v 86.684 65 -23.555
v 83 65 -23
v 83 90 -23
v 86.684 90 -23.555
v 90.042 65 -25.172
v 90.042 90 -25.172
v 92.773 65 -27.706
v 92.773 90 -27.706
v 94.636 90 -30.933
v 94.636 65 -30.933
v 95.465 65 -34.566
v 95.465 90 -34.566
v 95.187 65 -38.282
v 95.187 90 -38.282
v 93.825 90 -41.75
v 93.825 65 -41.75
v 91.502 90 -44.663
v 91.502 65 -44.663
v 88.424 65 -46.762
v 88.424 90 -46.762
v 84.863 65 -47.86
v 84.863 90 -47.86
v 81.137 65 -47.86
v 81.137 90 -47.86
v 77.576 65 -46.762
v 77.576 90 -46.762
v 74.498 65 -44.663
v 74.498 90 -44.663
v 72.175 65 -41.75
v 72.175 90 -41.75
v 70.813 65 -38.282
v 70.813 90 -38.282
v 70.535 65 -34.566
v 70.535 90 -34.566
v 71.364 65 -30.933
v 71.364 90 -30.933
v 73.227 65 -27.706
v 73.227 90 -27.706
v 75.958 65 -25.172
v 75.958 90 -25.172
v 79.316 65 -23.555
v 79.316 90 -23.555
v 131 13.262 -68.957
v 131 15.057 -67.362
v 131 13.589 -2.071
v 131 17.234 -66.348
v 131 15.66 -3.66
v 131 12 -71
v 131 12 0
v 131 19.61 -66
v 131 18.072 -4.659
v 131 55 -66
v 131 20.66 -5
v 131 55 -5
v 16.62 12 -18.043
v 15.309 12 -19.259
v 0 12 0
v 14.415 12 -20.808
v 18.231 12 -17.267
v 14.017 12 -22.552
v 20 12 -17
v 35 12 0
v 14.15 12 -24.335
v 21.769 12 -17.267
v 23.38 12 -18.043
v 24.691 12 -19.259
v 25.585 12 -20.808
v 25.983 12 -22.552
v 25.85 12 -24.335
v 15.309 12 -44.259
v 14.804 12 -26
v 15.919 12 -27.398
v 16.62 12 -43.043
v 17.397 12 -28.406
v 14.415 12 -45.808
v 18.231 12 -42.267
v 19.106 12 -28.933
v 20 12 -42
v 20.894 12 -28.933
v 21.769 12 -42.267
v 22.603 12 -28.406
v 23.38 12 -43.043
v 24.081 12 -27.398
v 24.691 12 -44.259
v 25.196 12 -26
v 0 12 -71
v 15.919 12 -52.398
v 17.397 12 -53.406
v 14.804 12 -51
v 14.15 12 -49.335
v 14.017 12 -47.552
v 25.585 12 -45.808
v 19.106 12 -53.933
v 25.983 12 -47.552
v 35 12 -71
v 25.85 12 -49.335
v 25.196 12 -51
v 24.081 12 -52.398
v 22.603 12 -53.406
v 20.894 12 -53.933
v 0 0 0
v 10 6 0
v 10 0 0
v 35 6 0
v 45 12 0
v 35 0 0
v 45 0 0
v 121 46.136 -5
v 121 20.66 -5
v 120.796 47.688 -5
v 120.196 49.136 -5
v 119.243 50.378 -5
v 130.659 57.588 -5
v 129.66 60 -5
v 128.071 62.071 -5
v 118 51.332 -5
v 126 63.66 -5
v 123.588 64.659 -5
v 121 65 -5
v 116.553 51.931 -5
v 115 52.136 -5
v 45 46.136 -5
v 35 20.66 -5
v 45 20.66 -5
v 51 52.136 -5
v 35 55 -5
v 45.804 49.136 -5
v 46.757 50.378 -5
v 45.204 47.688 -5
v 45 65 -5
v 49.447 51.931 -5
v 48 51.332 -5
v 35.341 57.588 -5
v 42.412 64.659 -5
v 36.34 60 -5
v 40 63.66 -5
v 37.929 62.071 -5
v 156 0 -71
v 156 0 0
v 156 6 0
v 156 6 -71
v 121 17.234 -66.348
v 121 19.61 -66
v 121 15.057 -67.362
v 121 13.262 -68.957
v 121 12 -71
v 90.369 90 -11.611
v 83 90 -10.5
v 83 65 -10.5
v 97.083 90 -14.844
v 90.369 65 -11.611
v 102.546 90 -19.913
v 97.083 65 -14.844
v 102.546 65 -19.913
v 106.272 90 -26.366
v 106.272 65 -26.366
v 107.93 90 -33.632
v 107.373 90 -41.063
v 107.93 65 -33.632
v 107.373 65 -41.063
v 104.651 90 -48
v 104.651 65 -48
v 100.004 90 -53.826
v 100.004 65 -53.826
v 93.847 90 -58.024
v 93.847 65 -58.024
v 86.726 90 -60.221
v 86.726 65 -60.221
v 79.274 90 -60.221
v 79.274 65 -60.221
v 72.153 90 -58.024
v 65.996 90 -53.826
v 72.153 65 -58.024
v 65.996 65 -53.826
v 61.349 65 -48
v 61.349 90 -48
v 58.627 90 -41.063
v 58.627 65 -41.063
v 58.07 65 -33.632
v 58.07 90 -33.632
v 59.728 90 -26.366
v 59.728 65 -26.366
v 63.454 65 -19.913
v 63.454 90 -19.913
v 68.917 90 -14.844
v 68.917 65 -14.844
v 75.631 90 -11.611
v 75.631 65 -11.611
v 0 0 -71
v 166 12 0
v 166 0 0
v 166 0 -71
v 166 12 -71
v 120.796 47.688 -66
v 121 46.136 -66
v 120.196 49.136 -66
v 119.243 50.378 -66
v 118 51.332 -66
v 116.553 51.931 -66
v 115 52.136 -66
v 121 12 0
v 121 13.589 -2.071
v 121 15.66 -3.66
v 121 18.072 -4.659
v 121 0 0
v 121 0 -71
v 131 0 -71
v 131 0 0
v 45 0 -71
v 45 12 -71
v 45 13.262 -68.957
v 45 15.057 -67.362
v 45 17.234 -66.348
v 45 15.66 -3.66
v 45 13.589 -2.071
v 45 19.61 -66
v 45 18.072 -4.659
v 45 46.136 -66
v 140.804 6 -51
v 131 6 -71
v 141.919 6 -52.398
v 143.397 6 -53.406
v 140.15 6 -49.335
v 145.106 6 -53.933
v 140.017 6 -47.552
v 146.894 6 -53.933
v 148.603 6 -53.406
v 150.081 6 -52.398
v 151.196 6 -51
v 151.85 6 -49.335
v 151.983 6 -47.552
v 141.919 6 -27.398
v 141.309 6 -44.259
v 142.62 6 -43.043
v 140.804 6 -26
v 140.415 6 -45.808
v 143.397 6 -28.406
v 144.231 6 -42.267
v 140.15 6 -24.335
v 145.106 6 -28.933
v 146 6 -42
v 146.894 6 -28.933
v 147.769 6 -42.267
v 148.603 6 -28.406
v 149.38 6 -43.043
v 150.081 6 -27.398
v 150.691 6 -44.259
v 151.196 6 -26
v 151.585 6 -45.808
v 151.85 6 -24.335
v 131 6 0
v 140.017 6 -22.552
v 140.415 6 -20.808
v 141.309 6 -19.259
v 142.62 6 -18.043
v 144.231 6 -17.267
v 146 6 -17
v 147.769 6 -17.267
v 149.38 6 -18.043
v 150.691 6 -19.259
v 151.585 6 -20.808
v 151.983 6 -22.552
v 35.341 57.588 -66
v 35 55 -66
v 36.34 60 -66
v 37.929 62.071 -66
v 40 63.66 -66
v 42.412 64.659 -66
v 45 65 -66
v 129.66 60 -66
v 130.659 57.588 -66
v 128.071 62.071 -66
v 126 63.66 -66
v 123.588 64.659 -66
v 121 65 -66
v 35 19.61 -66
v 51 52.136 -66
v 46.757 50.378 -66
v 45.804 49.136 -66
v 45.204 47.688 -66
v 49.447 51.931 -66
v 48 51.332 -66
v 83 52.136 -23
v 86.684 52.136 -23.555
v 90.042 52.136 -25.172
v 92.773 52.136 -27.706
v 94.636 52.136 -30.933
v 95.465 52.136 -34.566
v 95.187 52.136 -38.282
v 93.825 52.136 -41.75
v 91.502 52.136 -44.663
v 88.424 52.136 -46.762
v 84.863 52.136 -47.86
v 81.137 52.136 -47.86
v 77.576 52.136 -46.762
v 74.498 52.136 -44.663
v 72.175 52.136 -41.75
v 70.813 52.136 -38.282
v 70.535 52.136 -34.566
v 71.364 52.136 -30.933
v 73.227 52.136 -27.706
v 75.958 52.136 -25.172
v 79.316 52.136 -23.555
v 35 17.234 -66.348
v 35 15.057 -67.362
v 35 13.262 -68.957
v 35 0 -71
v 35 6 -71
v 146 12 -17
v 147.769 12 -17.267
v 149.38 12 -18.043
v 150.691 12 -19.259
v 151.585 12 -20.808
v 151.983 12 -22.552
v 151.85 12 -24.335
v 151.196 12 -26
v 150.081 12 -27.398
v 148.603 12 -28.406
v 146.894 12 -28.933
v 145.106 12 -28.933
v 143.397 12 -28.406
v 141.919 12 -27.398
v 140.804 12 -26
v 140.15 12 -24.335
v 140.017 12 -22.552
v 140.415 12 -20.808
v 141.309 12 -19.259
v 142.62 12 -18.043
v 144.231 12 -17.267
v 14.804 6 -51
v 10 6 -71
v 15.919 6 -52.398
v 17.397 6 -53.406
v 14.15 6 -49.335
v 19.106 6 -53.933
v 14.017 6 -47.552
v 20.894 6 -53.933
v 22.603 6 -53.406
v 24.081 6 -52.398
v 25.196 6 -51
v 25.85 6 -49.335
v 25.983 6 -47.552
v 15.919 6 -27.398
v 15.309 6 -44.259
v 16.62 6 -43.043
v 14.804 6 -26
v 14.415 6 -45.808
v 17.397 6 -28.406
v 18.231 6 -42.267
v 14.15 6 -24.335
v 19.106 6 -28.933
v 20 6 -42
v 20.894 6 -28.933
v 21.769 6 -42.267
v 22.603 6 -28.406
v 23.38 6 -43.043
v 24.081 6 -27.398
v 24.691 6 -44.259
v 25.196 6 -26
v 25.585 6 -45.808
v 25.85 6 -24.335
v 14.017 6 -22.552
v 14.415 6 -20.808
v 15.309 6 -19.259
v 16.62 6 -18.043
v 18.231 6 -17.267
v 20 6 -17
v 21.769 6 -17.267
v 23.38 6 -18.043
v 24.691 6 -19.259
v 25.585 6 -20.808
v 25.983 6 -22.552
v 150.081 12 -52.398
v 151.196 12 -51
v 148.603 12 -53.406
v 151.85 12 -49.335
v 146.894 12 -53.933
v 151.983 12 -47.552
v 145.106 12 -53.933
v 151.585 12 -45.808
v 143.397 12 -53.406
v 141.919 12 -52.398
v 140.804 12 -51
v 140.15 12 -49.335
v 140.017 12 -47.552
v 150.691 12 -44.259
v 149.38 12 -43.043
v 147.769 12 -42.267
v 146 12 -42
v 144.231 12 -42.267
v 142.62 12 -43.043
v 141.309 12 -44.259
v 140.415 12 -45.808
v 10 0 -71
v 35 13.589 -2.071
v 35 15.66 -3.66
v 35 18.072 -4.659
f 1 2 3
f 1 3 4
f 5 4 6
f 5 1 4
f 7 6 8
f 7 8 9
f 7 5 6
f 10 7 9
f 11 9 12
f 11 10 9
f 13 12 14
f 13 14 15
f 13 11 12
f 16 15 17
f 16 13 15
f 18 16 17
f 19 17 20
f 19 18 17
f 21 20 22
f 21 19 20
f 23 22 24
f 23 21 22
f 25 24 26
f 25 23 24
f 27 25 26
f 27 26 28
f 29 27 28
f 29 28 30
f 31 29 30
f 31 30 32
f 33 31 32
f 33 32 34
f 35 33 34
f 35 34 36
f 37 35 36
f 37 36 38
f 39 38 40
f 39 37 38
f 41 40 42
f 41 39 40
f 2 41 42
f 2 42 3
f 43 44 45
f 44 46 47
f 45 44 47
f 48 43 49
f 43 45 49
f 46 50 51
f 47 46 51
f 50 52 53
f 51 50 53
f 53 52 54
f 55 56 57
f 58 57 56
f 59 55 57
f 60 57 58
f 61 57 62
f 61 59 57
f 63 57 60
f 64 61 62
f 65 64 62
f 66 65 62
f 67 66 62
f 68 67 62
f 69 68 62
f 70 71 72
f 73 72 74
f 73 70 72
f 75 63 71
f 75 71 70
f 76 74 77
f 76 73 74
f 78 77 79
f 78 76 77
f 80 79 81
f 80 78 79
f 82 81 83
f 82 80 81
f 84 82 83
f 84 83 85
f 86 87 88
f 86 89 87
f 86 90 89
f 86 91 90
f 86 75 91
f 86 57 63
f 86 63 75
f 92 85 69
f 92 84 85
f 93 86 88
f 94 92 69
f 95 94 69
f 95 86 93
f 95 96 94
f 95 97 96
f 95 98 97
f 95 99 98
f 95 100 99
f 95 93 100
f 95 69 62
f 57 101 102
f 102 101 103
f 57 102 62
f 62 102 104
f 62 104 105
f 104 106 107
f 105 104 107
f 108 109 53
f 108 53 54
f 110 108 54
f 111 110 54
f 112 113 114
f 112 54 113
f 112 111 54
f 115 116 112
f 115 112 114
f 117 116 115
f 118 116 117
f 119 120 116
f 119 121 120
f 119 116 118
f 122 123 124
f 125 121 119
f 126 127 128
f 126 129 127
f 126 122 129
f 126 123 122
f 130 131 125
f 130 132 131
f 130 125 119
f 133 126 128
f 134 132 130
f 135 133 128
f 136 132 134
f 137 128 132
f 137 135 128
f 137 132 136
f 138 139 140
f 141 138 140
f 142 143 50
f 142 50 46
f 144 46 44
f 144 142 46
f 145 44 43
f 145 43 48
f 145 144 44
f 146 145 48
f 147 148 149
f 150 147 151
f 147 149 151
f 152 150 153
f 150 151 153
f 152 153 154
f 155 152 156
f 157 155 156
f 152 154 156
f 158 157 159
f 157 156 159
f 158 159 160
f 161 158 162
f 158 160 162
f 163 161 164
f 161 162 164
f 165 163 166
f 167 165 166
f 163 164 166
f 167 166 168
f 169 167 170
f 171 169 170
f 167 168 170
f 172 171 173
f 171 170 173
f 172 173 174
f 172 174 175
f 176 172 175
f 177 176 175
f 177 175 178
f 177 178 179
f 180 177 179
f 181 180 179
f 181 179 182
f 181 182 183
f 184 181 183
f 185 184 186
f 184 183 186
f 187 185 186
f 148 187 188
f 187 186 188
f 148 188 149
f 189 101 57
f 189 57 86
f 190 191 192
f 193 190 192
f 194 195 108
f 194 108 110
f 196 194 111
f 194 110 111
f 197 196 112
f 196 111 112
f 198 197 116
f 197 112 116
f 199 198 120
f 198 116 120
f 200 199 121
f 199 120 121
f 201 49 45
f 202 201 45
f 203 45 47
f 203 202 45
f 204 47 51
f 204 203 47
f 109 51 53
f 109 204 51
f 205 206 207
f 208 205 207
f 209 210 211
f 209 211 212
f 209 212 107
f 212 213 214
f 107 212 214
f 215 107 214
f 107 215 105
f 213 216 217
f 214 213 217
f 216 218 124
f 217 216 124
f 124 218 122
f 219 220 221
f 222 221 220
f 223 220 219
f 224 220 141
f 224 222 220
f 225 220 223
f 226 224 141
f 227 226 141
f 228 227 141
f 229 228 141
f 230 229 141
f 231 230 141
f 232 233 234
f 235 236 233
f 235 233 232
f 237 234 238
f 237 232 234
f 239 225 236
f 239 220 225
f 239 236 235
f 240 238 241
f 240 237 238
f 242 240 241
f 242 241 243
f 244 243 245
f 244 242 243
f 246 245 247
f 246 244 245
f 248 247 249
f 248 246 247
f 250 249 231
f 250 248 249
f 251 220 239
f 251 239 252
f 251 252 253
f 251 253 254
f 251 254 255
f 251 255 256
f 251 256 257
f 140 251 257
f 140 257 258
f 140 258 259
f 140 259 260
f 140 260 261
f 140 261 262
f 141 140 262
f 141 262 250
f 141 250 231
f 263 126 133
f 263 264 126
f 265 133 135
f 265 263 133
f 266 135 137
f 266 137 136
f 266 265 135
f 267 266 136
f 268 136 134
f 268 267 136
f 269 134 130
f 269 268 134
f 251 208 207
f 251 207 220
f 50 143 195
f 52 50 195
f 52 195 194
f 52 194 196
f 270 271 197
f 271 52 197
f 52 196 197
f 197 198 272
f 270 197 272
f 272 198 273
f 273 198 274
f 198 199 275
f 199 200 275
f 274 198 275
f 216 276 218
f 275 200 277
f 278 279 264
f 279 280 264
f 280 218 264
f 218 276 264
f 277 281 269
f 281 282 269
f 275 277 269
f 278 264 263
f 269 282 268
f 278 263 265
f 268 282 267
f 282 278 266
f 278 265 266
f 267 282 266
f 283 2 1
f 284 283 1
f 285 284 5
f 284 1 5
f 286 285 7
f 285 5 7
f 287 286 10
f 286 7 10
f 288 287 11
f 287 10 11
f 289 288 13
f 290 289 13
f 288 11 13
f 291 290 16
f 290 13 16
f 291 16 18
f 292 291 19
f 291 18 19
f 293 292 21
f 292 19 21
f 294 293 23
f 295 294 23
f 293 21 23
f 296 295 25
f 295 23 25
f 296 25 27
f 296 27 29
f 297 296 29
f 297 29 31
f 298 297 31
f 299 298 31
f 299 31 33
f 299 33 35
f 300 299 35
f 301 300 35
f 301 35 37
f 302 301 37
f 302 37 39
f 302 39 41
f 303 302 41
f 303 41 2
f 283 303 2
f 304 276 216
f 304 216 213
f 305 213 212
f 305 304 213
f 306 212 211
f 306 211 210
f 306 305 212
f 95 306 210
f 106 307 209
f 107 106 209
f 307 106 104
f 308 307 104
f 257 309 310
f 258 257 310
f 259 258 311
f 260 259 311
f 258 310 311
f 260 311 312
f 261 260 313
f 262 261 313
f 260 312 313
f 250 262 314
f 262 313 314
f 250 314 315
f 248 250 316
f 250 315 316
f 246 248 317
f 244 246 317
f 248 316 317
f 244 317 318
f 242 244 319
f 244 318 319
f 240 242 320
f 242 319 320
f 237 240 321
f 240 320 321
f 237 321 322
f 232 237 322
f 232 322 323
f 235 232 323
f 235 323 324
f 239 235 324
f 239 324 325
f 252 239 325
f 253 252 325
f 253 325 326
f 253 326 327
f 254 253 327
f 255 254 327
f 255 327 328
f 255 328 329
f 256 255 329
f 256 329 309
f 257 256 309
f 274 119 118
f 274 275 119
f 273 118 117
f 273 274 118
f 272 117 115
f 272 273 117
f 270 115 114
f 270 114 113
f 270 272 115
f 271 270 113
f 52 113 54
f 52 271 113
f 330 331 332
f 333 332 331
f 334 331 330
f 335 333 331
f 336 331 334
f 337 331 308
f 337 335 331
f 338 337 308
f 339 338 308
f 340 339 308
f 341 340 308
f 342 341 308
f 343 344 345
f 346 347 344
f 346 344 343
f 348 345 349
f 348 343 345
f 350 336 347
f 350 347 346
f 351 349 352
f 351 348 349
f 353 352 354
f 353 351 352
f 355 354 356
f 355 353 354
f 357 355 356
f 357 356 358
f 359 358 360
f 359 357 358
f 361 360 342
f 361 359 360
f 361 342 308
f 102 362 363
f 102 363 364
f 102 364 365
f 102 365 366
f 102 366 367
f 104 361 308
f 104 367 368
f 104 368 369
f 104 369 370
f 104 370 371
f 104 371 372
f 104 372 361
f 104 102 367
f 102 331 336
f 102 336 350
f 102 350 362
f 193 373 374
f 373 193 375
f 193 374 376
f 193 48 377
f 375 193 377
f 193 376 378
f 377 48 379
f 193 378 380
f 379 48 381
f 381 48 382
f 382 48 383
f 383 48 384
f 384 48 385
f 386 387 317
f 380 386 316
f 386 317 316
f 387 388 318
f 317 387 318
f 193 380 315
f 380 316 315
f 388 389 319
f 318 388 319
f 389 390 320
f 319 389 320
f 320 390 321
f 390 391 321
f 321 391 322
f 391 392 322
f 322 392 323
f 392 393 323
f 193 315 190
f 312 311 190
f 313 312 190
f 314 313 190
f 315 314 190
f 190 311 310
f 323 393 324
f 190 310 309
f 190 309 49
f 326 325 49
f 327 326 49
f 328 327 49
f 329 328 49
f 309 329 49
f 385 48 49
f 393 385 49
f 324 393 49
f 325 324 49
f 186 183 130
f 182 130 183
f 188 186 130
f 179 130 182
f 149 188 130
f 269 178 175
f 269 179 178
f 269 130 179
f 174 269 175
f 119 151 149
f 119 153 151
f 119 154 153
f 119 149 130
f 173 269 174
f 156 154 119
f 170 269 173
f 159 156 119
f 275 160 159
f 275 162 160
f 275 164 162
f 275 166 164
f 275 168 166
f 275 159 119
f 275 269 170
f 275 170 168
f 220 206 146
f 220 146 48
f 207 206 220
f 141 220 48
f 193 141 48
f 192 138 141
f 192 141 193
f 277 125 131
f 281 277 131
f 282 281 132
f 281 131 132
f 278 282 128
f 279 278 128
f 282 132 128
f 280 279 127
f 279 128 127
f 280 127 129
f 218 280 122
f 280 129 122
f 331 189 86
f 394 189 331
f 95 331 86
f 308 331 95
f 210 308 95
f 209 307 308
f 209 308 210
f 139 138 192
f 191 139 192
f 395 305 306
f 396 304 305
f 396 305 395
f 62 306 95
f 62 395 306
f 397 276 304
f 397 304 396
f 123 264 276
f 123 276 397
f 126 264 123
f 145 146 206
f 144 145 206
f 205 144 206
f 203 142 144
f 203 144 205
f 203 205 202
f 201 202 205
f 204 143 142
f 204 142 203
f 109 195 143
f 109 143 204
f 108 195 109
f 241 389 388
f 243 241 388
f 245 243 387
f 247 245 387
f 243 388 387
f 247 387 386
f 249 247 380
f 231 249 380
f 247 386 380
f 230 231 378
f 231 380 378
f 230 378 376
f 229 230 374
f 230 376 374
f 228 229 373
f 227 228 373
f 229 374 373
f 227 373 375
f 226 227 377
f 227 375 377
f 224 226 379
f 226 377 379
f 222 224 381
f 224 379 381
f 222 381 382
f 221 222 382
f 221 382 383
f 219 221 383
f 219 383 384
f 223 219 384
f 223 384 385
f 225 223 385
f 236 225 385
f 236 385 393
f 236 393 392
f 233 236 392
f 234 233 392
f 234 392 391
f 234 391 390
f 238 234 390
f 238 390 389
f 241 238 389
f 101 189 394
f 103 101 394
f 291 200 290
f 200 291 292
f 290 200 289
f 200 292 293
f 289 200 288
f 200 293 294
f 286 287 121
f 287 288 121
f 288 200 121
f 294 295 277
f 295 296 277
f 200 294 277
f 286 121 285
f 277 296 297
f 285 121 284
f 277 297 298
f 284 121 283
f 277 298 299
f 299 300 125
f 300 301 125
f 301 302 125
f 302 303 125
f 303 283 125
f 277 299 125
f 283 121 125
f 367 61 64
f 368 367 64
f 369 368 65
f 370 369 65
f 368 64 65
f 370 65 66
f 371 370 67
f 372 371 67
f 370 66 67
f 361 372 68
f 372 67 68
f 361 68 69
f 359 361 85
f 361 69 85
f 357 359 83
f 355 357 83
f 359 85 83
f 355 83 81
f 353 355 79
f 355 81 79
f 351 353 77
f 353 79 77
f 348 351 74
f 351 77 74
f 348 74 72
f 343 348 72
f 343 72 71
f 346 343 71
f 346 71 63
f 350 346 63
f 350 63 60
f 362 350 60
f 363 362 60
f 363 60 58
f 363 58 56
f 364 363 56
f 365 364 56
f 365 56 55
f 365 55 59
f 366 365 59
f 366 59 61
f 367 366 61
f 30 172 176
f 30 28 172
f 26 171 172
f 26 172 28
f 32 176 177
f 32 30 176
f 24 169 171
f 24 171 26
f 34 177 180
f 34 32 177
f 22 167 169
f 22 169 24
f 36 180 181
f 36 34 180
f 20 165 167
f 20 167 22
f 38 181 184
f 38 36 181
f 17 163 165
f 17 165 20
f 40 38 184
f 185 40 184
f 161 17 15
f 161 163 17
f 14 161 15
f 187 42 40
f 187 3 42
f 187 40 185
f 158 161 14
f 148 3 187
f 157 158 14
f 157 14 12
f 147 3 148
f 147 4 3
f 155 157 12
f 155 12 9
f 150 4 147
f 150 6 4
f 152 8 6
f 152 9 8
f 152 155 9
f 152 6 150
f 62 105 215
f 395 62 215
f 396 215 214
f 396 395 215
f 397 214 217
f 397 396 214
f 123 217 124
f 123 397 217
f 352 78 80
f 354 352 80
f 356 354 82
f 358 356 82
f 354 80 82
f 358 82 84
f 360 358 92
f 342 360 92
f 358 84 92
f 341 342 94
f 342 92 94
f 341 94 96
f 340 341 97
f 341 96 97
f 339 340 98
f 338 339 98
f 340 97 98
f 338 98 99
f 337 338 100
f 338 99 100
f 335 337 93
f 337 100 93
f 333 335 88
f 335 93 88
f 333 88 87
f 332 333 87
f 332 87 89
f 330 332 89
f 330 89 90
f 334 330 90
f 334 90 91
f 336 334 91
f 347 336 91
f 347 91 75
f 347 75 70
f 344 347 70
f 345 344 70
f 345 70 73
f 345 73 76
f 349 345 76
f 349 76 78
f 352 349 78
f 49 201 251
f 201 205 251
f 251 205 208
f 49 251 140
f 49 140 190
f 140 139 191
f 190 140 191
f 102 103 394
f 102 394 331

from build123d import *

# Parameters (mm, degrees)
SKETCH1_W           = 166
SKETCH1_H           = 71
BOSS_EXTRUDE1_DEPTH = 12
SKETCH2_R           = 6
CUT_EXTRUDE1_DEPTH  = 181.944742947
SKETCH3_W           = 96
SKETCH3_H           = 71
BOSS_EXTRUDE2_DEPTH = 53
SKETCH4_W           = 25
SKETCH4_H           = 6
CUT_EXTRUDE2_DEPTH  = 192.890593829
SKETCH5_W           = 5
SKETCH5_H           = 53
CUT_EXTRUDE4_DEPTH  = 163.563833616
BOSS_EXTRUDE4_DEPTH = 10
BOSS_EXTRUDE5_START = -10
BOSS_EXTRUDE5_DEPTH = 10
FILLET4_R           = 10
FILLET5_R           = 10
SKETCH11_R          = 25
SKETCH11_R_2        = 12.5
BOSS_EXTRUDE6_DEPTH = 25
SKETCH12_R          = 12.5
CUT_EXTRUDE5_DEPTH  = 192.890593829


with BuildPart() as part:
    # Sketch1 → Boss-Extrude1 (new body)
    with BuildSketch(Plane(origin=(0, 0, 0), x_dir=(1, 0, 0), z_dir=(0, 1, 0))):
        with Locations((83, 35.5)):
            Rectangle(SKETCH1_W, SKETCH1_H)
    extrude(amount=BOSS_EXTRUDE1_DEPTH)

    # Sketch2 → Cut-Extrude1 (cut, through all)
    with BuildSketch(Plane(origin=(0, 12, 0), x_dir=(1, 0, 0), z_dir=(0, 1, 0))):
        with Locations(Location((20, 48, 0), (0, 0, 270))):
            Circle(SKETCH2_R)
        with Locations(Location((20, 23, 0), (0, 0, 270))):
            Circle(SKETCH2_R)
        with Locations(Location((146, 48, 0), (0, 0, 270))):
            Circle(SKETCH2_R)
        with Locations(Location((146, 23, 0), (0, 0, 270))):
            Circle(SKETCH2_R)
    extrude(amount=-CUT_EXTRUDE1_DEPTH, mode=Mode.SUBTRACT)

    # Sketch3 → Boss-Extrude2 (add)
    with BuildSketch(Plane(origin=(0, 12, 0), x_dir=(1, 0, 0), z_dir=(0, 1, 0))):
        with Locations((83, 35.5)):
            Rectangle(SKETCH3_W, SKETCH3_H)
    extrude(amount=BOSS_EXTRUDE2_DEPTH)

    # Sketch4 → Cut-Extrude2 (cut, through all)
    with BuildSketch(Plane.XY):
        with BuildLine():
            Line((45, 0), (121, 0))
            Line((121, 0), (121, 46.135540556))
            ThreePointArc((121, 46.135540556), (119.242640687, 50.378181243), (115, 52.135540556))
            Line((115, 52.135540556), (51, 52.135540556))
            ThreePointArc((51, 52.135540556), (46.757359313, 50.378181243), (45, 46.135540556))
            Line((45, 46.135540556), (45, 0))
        make_face()
        with Locations((22.5, 3)):
            Rectangle(SKETCH4_W, SKETCH4_H)
        with Locations((143.5, 3)):
            Rectangle(SKETCH4_W, SKETCH4_H)
    extrude(amount=-CUT_EXTRUDE2_DEPTH, mode=Mode.SUBTRACT)

    # Sketch5 → Cut-Extrude4 (cut, through all)
    with BuildSketch(Plane.ZY.offset(-35)):
        with Locations((-68.5, 38.5)):
            Rectangle(SKETCH5_W, SKETCH5_H)
        with Locations((-2.5, 38.5)):
            Rectangle(SKETCH5_W, SKETCH5_H)
    extrude(amount=-CUT_EXTRUDE4_DEPTH, mode=Mode.SUBTRACT)

    # Sketch7 → Boss-Extrude4 (add)
    with BuildSketch(Plane.ZY.offset(-35)):
        with BuildLine():
            Line((-71, 12), (-66, 12))
            Line((-66, 12), (-66, 19.610148588))
            ThreePointArc((-66, 19.610148588), (-67.361838539, 15.057282415), (-71, 12))
        make_face()
        with BuildLine():
            Line((-5, 20.660254038), (-5, 12))
            Line((-5, 12), (0, 12))
            ThreePointArc((0, 12), (-3.660254038, 15.660254038), (-5, 20.660254038))
        make_face()
    extrude(amount=-BOSS_EXTRUDE4_DEPTH)

    # Sketch10 → Boss-Extrude5 (add)
    with BuildSketch(Plane(origin=(131, 0, 0), x_dir=(0, 0, -1), z_dir=(1, 0, 0)).offset(BOSS_EXTRUDE5_START)):
        with BuildLine():
            Line((5, 20.660254038), (5, 12))
            Line((5, 12), (0, 12))
            ThreePointArc((0, 12), (3.660254038, 15.660254038), (5, 20.660254038))
        make_face()
        with BuildLine():
            Line((71, 12), (66, 12))
            Line((66, 12), (66, 19.610148588))
            ThreePointArc((66, 19.610148588), (67.361838539, 15.057282415), (71, 12))
        make_face()
    extrude(amount=BOSS_EXTRUDE5_DEPTH)

    # Fillet4
    fillet4_edges = [part.edges().sort_by_distance(p)[0] for p in [
        (35, 65, -35.5),
    ]]
    fillet(fillet4_edges, radius=FILLET4_R)

    # Fillet5
    fillet5_edges = [part.edges().sort_by_distance(p)[0] for p in [
        (131, 65, -35.5),
    ]]
    fillet(fillet5_edges, radius=FILLET5_R)

    # Sketch11 → Boss-Extrude6 (add)
    with BuildSketch(Plane(origin=(0, 65, 0), x_dir=(1, 0, 0), z_dir=(0, 1, 0))):
        with Locations(Location((83, 35.5, 0), (0, 0, 270))):
            Circle(SKETCH11_R)
        with Locations(Location((83, 35.5, 0), (0, 0, 270))):
            Circle(SKETCH11_R_2, mode=Mode.SUBTRACT)
    extrude(amount=BOSS_EXTRUDE6_DEPTH)

    # Sketch12 → Cut-Extrude5 (cut, through all)
    with BuildSketch(Plane(origin=(0, 65, 0), x_dir=(1, 0, 0), z_dir=(0, 1, 0))):
        with Locations(Location((83, 35.5, 0), (0, 0, 270))):
            Circle(SKETCH12_R)
    extrude(amount=-CUT_EXTRUDE5_DEPTH, mode=Mode.SUBTRACT)


solid = part.part
